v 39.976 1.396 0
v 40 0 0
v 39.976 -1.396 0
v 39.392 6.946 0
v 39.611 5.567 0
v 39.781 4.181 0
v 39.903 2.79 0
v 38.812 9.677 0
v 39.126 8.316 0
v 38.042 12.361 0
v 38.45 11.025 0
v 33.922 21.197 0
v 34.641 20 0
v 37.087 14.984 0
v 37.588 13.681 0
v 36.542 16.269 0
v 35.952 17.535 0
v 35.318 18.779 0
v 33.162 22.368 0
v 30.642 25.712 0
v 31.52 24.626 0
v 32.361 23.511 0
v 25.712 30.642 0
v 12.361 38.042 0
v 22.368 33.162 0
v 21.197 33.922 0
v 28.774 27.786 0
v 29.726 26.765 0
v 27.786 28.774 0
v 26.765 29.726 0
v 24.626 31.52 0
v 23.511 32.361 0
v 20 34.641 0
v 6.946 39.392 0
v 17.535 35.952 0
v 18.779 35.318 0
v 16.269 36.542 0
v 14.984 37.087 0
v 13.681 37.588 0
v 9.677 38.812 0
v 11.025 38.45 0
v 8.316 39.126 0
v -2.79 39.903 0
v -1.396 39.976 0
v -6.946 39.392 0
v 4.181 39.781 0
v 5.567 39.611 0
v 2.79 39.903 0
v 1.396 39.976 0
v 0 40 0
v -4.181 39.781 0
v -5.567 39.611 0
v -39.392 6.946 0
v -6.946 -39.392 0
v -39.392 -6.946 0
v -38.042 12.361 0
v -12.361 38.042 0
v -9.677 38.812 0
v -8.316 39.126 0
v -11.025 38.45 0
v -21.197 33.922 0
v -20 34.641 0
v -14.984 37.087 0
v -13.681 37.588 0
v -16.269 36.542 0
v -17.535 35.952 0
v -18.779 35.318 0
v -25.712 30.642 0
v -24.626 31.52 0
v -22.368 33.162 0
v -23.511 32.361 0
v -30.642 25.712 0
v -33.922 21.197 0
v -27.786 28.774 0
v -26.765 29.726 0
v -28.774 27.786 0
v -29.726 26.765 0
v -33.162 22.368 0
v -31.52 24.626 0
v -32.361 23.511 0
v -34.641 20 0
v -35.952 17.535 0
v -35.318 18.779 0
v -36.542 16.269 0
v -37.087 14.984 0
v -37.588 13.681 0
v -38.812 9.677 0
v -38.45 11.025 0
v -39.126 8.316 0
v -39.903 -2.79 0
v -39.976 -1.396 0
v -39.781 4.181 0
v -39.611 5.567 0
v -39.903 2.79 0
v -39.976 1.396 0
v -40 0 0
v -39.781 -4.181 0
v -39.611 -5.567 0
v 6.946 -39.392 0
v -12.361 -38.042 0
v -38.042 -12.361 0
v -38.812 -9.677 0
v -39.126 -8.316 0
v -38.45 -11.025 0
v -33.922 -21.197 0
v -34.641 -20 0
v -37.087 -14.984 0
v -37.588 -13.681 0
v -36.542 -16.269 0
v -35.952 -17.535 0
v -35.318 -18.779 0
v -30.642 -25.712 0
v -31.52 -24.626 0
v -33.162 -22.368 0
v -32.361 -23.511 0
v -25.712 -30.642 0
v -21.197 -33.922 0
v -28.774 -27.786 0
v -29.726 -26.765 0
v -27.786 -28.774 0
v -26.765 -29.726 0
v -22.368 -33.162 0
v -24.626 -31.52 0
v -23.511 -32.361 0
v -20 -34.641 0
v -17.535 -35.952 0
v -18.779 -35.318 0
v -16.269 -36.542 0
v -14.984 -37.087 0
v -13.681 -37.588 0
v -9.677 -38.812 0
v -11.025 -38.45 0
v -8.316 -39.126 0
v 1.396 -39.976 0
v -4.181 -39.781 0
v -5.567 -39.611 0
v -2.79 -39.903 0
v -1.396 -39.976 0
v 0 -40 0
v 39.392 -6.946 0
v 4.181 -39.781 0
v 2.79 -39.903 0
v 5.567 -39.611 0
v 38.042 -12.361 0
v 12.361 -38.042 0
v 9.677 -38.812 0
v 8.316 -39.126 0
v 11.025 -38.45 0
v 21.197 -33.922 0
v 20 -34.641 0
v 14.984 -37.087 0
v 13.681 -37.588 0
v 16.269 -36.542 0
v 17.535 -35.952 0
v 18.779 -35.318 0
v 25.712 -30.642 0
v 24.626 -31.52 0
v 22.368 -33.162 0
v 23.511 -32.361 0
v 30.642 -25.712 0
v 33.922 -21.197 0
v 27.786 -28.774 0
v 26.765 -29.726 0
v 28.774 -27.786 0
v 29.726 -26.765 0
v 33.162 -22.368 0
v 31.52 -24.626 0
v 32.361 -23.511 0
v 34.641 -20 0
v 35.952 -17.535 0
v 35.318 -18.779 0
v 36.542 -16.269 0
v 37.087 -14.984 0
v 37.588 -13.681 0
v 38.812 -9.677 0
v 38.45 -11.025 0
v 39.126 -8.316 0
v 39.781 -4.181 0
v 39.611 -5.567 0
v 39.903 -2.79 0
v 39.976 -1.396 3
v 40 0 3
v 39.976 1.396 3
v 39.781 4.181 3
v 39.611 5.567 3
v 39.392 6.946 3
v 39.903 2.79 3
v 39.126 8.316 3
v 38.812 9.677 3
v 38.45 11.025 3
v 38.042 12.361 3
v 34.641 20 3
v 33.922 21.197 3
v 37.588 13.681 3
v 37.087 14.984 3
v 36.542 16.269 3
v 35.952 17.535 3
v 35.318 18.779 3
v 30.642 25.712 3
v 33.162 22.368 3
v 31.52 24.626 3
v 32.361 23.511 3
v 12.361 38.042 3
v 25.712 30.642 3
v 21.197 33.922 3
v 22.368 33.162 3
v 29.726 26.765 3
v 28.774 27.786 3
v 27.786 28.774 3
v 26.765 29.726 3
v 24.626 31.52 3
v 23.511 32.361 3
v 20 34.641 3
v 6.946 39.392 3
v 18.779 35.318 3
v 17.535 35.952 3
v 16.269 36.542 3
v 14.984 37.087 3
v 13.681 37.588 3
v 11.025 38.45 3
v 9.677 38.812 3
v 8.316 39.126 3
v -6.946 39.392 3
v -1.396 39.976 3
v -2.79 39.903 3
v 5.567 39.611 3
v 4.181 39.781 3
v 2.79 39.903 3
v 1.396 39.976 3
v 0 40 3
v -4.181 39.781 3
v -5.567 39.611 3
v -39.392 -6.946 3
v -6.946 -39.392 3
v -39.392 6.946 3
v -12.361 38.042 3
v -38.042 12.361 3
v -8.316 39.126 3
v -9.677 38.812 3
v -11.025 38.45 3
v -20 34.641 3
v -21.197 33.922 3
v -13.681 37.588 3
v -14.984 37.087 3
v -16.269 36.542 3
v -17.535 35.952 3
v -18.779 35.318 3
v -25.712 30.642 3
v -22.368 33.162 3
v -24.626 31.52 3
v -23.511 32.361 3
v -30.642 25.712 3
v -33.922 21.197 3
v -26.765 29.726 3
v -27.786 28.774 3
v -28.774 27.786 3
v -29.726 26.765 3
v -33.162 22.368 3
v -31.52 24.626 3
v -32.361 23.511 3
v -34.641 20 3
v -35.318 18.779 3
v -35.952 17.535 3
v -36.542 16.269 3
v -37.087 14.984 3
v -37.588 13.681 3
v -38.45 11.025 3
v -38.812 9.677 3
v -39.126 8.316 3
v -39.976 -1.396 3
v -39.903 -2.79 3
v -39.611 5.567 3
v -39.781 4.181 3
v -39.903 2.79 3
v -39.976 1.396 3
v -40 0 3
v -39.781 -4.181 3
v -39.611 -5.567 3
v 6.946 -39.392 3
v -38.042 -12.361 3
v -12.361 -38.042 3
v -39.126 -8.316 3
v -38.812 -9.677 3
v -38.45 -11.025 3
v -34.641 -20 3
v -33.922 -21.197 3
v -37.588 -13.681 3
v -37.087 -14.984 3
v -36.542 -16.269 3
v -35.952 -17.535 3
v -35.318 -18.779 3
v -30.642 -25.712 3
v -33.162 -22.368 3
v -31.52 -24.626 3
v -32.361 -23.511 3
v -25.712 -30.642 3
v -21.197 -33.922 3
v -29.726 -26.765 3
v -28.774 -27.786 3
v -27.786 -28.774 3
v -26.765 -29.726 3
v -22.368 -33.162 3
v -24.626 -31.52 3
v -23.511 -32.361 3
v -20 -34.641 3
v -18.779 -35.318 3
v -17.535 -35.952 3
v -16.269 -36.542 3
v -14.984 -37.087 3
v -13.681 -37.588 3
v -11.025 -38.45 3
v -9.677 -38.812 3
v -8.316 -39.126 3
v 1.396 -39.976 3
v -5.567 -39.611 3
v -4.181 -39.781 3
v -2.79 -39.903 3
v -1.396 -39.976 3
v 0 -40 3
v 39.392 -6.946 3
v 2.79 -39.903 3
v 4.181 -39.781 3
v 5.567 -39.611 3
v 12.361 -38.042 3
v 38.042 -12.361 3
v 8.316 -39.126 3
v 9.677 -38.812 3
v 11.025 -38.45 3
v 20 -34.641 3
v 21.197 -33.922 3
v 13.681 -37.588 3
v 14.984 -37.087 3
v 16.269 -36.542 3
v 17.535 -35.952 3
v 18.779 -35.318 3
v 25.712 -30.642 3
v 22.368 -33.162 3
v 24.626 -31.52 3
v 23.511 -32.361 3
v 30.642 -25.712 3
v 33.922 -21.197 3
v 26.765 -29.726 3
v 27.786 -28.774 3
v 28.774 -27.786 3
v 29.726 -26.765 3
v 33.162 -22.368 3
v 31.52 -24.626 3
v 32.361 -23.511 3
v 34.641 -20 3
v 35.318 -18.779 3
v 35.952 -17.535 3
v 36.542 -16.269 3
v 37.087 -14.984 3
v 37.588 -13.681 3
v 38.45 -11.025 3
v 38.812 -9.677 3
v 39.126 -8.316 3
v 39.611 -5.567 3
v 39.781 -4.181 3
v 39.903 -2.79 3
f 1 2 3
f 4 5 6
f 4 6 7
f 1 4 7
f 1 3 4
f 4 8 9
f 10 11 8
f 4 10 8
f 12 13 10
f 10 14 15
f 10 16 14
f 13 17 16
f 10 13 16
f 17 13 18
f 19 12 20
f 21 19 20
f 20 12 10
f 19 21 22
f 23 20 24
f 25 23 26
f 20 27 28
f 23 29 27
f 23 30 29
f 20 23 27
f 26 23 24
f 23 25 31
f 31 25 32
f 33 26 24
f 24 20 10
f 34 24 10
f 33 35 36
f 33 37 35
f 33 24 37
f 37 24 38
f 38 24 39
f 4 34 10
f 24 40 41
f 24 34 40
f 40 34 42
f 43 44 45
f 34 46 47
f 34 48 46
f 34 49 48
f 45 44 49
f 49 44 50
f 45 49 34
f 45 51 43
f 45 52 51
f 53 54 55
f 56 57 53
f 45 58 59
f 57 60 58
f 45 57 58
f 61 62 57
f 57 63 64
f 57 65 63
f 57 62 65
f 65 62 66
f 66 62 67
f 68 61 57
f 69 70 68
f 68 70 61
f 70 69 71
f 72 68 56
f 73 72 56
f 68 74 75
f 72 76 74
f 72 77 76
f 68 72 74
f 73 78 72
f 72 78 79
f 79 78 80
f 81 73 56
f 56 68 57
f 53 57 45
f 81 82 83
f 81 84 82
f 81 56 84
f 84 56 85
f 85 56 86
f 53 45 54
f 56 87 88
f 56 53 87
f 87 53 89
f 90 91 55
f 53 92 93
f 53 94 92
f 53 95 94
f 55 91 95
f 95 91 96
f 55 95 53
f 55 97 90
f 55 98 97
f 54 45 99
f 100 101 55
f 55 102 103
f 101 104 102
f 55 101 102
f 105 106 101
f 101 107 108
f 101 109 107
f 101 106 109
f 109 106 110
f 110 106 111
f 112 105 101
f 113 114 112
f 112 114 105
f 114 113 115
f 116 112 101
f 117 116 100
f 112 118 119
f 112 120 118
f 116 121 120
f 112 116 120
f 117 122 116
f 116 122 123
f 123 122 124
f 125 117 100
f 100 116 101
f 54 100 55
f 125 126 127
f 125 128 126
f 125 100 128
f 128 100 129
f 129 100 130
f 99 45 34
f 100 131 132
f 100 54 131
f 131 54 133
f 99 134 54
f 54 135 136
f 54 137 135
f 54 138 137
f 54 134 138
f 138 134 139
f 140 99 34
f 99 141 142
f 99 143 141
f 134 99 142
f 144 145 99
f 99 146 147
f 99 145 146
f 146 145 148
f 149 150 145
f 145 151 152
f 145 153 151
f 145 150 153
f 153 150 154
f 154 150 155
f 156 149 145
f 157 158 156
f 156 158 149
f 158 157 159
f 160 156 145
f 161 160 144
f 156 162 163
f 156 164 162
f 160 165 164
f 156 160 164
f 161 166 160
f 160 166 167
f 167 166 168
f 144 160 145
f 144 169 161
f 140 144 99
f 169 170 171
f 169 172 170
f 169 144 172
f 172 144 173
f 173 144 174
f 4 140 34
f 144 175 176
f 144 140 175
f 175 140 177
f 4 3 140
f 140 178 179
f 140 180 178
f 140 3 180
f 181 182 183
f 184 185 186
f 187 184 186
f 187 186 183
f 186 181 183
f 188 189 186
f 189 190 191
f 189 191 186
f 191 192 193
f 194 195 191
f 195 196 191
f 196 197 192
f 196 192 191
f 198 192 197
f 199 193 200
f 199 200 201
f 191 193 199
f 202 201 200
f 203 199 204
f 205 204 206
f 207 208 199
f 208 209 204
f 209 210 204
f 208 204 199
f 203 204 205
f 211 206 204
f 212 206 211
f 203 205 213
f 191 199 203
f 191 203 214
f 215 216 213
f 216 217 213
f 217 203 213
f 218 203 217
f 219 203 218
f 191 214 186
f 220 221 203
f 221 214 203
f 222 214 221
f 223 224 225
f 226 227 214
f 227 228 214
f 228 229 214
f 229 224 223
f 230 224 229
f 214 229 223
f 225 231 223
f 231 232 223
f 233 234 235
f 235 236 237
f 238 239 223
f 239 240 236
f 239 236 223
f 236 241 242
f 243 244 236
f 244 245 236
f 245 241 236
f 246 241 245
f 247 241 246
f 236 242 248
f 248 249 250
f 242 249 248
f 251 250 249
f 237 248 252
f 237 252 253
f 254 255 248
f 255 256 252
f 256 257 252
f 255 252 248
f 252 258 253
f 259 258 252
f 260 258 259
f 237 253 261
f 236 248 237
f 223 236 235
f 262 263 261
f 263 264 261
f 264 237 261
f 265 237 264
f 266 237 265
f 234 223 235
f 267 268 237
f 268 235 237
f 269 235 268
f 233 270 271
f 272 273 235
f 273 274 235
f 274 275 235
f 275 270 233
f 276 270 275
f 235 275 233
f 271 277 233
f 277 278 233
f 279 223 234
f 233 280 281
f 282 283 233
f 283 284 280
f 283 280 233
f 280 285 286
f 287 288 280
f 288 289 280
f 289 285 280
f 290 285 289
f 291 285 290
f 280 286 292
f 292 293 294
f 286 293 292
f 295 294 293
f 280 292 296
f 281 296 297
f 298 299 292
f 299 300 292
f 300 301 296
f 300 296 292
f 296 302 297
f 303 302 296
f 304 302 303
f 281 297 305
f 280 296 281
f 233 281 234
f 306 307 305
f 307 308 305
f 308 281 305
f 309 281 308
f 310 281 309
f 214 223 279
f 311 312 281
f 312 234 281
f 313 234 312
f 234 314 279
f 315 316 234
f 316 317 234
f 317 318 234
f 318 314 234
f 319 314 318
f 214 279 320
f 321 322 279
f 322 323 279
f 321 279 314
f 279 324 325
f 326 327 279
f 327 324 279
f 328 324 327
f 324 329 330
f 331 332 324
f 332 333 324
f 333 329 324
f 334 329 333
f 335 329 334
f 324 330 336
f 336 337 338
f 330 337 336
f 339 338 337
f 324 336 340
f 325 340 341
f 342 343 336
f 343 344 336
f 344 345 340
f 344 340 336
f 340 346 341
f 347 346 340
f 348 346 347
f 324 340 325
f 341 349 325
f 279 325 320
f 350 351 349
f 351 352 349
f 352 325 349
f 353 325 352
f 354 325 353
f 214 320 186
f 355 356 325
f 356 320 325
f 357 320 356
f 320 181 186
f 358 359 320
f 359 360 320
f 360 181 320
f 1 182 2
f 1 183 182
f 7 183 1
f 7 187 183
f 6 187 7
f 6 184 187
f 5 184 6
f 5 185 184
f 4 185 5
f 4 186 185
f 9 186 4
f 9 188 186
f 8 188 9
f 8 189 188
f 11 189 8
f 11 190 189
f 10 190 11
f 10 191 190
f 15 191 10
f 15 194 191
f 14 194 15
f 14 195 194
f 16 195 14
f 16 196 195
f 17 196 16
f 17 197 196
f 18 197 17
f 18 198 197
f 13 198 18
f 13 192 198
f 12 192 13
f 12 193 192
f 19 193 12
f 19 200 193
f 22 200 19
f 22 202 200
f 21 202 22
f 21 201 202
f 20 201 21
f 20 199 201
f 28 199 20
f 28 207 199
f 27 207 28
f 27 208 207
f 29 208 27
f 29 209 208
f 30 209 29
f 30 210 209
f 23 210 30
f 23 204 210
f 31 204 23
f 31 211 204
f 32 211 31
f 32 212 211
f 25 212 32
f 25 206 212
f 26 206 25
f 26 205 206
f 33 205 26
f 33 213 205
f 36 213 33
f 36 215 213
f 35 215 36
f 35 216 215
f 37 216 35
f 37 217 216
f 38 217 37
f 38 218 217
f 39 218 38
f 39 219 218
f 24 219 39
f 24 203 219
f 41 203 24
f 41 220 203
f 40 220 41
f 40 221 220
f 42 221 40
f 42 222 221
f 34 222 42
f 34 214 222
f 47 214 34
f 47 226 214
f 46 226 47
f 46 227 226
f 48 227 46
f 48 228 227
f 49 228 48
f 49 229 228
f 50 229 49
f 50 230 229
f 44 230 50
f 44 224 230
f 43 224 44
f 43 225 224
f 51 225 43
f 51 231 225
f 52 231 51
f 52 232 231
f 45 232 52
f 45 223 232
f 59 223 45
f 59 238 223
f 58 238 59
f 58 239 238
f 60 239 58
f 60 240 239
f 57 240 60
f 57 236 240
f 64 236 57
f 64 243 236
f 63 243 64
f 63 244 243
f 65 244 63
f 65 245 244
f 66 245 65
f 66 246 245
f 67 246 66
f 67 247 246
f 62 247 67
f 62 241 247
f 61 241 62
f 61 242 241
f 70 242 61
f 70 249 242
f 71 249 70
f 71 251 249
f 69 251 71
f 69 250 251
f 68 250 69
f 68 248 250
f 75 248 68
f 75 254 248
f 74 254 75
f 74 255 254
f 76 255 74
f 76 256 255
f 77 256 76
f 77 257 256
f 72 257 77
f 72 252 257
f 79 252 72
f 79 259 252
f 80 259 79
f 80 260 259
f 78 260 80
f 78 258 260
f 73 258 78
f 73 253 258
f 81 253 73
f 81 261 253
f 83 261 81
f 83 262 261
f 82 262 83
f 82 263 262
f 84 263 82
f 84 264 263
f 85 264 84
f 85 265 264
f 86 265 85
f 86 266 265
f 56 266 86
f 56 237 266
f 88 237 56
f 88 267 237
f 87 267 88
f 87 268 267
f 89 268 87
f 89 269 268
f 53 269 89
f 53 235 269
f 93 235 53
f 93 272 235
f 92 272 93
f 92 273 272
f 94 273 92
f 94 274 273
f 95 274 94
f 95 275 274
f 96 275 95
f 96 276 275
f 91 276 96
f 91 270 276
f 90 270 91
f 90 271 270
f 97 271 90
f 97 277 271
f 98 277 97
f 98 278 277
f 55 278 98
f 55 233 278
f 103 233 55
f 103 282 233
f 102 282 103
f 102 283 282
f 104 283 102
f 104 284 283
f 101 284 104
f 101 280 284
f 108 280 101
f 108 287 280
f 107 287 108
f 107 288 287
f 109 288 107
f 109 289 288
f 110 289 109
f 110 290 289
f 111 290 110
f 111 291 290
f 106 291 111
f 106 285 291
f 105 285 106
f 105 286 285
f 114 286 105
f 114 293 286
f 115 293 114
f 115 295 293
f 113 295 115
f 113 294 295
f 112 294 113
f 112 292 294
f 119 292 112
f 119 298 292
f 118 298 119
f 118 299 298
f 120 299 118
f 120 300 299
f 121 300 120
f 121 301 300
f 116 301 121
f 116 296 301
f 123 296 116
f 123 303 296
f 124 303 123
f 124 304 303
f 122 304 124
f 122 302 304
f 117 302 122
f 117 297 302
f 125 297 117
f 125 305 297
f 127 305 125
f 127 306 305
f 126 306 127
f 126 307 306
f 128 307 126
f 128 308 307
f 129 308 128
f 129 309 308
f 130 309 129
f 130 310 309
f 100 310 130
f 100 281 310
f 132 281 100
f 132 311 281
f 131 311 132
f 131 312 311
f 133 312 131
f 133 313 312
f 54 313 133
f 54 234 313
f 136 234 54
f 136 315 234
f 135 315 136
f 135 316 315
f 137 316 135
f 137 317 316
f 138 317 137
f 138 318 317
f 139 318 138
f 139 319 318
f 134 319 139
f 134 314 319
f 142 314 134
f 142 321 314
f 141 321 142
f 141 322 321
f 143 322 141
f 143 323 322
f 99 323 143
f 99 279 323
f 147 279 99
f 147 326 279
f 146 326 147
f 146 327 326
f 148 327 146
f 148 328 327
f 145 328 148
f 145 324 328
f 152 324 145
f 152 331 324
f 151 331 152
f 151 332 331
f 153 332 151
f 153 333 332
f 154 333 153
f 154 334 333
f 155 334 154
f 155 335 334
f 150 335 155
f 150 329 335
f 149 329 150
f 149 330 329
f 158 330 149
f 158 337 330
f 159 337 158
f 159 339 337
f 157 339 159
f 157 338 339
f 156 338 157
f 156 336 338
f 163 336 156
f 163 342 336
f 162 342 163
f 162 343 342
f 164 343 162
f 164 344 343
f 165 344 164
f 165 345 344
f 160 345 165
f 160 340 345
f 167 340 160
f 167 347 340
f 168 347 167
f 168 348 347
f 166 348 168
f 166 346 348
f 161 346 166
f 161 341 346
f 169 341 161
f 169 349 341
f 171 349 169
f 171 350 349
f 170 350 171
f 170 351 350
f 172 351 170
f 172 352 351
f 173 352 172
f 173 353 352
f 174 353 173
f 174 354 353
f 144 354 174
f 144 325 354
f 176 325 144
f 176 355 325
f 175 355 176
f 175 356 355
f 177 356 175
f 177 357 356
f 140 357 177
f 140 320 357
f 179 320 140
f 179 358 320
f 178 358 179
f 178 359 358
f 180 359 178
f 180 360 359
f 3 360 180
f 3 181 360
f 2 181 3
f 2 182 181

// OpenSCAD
// file: bellum_badge_001.scad
// bellum_badge_001.scad
// Two-color badge of the "Bellum" checkerboard logo, built as separate
// printable parts (print some in white, some in black, glue together):
//   base_disc()          black - circle background; its top surface shows
//                        through the lattice holes as the black squares
//   white_lattice()      white - diamond border + white squares + grout
//                        webs, one connected piece; glue onto the disc
//   black_tiles()        black - optional drop-in tiles if you want the
//                        black squares flush with the white top surface
//   text_plate_black()   black - outline plate behind the letters (the
//                        logo's dark text outline)
//   text_letters_white() white - "Bellum" letters, glue onto the plate
//
// Everything scales from badge_d. Layer thicknesses and fit clearance are
// absolute (printer-dependent), so they stay put when you rescale.
// Companion files export one part each: _base, _lattice, _tiles,
// _text_black, _text_white. This master file shows the assembled badge.

$fa = 2;
$fs = 0.4;

// ---- scale ----
badge_d = 80;       // badge diameter: THE scale knob
n       = 5;        // checker tiles per row (odd -> black diamond corners)

// ---- thicknesses (absolute mm, independent of badge_d) ----
t_base = 3;         // black disc
t_top  = 2;         // white lattice and drop-in tiles (total badge = 5)
t_text = 1.2;       // each text layer (plate and letters)
clr    = 0.15;      // per-side XY clearance for the drop-in tiles

// ---- proportions (fractions of badge_d, from the logo) ----
diamond_frac = 0.94;   // diamond diagonal / badge diameter
border_w = max(0.045 * badge_d, 1.6);  // white rim around the checker field
grout_w  = max(0.014 * badge_d, 0.8);  // white web between tiles
text_w   = 0.80 * badge_d;             // width of "Bellum"
outline_w = max(0.022 * badge_d, 1.2); // black outline around the letters
bold_w    = 0.004 * badge_d;           // stroke thickening for printability

font = "Gabriola";  // ornate serif; try "Palatino Linotype:style=Bold Italic"

// ---- derived ----
half_diag = diamond_frac * badge_d / 2;
sq_o  = half_diag * sqrt(2);            // outer side of the white diamond
sq_f  = sq_o - 2 * border_w;            // side of the checker field
tile  = (sq_f - (n - 1) * grout_w) / n; // checker tile size
pitch = tile + grout_w;

eps = 0.01;

// ---------------- 2D shapes ----------------

// centers of the black squares, in the unrotated field frame
function tile_org(i) = -sq_f / 2 + i * pitch;

module black_squares_2d(shrink = 0) {
    for (i = [0 : n - 1], j = [0 : n - 1])
        if ((i + j) % 2 == 0)
            translate([tile_org(i) + shrink, tile_org(j) + shrink])
                square(tile - 2 * shrink);
}

// white diamond: border + white squares + grout webs (one connected piece)
module lattice_2d() {
    rotate(45) difference() {
        square(sq_o, center = true);
        black_squares_2d();
    }
}

module text_2d() {
    offset(r = bold_w)
        resize([text_w, 0], auto = true)
            text("Bellum", size = 10, font = font,
                 halign = "center", valign = "center");
}

// ---------------- printable parts (each flat on Z=0) ----------------

module base_disc() {
    linear_extrude(t_base) circle(badge_d / 2);
}

module white_lattice() {
    linear_extrude(t_top) lattice_2d();
}

// optional flush inlays for the black squares, laid out for printing
module black_tiles() {
    for (i = [0 : n - 1], j = [0 : n - 1])
        if ((i + j) % 2 == 0)
            translate([i * (tile + 3), j * (tile + 3)])
                linear_extrude(t_top)
                    square(tile - 2 * clr);
}

module text_plate_black() {
    linear_extrude(t_text) offset(r = outline_w) text_2d();
}

module text_letters_white() {
    linear_extrude(t_text) text_2d();
}

// ---------------- assembled preview ----------------

module assembly() {
    color([0.15, 0.15, 0.15])  base_disc();
    color("white")   translate([0, 0, t_base]) white_lattice();
    color([0.15, 0.15, 0.15])  translate([0, 0, t_base + t_top]) text_plate_black();
    color("white")   translate([0, 0, t_base + t_top + t_text])
                         text_letters_white();
}

assembly();
// main file
// bellum_badge_001_base.scad - print in BLACK
// Circle background; its top shows through the lattice as the black squares.
use <bellum_badge_001.scad>
base_disc();
